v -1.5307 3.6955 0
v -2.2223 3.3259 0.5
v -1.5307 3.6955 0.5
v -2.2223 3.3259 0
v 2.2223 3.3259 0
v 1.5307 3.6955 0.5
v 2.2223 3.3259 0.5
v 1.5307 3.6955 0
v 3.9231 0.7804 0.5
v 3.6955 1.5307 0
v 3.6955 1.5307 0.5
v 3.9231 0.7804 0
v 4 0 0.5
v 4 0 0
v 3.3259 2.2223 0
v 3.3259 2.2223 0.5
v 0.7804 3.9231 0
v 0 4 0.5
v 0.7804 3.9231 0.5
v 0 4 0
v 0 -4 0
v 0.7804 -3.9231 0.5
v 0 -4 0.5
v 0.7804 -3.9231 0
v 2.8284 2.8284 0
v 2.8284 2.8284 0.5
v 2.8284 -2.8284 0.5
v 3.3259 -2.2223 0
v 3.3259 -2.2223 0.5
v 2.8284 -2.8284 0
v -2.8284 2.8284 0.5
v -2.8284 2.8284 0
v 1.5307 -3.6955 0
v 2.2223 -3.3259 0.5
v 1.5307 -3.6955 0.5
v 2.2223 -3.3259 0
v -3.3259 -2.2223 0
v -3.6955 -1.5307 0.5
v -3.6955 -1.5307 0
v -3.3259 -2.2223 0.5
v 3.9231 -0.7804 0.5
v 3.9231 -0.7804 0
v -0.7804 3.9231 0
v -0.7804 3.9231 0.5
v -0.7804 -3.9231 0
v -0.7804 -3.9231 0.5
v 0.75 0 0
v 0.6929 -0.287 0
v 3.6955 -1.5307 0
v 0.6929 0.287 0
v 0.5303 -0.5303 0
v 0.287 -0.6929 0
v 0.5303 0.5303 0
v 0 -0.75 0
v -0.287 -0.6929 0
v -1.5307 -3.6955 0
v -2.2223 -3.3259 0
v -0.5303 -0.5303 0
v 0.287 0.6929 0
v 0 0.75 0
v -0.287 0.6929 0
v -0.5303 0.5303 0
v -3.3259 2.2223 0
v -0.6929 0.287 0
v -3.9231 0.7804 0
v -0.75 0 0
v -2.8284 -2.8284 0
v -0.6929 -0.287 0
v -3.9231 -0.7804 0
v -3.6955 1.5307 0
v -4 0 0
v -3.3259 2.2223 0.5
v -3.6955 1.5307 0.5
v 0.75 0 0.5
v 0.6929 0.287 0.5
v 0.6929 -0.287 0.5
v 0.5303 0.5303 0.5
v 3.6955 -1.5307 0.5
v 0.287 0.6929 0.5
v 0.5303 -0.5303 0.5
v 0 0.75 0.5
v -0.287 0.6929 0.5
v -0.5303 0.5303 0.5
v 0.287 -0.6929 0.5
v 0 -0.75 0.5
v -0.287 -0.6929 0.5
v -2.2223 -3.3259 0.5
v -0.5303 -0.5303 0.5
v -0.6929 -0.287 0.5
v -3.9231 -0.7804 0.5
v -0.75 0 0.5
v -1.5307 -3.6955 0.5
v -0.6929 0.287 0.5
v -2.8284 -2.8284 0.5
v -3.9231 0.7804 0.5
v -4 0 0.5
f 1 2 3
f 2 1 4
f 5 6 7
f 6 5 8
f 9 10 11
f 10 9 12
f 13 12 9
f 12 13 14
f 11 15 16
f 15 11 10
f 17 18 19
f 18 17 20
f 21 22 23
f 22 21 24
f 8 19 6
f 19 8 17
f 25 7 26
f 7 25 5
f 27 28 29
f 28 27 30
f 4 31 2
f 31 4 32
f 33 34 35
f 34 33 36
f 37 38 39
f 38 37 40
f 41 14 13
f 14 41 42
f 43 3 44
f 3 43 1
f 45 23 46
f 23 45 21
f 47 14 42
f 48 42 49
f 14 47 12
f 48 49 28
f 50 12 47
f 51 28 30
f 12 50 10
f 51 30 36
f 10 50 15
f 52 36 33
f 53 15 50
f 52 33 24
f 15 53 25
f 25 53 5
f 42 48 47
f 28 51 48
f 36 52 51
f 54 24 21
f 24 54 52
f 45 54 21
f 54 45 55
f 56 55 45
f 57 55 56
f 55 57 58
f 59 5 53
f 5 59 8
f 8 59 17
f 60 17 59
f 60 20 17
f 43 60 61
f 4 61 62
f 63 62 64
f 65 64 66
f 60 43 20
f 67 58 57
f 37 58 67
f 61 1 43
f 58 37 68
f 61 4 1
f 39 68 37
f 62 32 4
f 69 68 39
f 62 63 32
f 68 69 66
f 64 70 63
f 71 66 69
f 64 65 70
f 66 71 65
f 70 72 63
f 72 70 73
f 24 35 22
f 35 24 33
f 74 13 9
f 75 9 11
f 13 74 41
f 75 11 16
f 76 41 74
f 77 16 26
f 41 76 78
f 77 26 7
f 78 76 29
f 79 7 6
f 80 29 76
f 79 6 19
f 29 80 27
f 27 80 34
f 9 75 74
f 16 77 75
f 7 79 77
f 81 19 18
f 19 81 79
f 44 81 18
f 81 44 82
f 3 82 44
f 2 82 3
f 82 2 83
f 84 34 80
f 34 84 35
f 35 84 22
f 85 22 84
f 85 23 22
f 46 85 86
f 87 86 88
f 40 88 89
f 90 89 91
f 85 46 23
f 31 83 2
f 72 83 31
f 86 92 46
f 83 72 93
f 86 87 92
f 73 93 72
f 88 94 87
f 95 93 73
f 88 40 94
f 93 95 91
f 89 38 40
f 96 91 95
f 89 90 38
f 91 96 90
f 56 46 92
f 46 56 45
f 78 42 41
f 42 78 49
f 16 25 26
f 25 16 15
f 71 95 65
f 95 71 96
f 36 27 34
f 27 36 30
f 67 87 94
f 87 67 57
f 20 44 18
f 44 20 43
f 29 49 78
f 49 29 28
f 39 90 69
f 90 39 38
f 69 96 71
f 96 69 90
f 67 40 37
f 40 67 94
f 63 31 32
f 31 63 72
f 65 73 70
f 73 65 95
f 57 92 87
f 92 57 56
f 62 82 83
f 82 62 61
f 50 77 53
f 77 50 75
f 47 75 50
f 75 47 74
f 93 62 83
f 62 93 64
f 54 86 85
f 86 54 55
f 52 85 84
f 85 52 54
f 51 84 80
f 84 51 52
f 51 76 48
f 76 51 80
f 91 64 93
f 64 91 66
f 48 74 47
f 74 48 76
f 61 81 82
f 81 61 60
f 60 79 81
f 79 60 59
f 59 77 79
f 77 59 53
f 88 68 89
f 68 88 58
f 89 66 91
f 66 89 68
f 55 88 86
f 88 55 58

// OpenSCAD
// ==========================================
// Xentient Interior — Landing Pads (Path B Glue Targets)
// Printed discs glued onto inner wall for M3 standoff placement
// ==========================================
// Print count: 4 (Zone B master board corners)
// Glue position: (±57, ±37) at Z=20 on inner cavity wall
// Adhesive: cyanoacrylate, scuff pad back + wall before gluing
// After gluing: scuff pad face, glue M3 standoff on top
// Per Framework §7: 8mm diameter × 0.5mm raised pads
// Units: mm

$fn = 32;

Pad_Dia    = 8.0;      // Landing pad diameter
Pad_T      = 0.5;     // Pad thickness (thin, just provides flat glue surface)
Pilot_D    = 1.5;     // Center pilot hole (marks exact standoff position)

module landing_pad() {
    difference() {
        cylinder(h=Pad_T, d=Pad_Dia, $fn=32);
        // Center pilot (drill guide for precise M3 positioning)
        translate([0, 0, -0.1])
            cylinder(h=Pad_T + 0.2, d=Pilot_D, $fn=16);
    }
}

// Render single pad (print 4 for Zone B)
landing_pad();
